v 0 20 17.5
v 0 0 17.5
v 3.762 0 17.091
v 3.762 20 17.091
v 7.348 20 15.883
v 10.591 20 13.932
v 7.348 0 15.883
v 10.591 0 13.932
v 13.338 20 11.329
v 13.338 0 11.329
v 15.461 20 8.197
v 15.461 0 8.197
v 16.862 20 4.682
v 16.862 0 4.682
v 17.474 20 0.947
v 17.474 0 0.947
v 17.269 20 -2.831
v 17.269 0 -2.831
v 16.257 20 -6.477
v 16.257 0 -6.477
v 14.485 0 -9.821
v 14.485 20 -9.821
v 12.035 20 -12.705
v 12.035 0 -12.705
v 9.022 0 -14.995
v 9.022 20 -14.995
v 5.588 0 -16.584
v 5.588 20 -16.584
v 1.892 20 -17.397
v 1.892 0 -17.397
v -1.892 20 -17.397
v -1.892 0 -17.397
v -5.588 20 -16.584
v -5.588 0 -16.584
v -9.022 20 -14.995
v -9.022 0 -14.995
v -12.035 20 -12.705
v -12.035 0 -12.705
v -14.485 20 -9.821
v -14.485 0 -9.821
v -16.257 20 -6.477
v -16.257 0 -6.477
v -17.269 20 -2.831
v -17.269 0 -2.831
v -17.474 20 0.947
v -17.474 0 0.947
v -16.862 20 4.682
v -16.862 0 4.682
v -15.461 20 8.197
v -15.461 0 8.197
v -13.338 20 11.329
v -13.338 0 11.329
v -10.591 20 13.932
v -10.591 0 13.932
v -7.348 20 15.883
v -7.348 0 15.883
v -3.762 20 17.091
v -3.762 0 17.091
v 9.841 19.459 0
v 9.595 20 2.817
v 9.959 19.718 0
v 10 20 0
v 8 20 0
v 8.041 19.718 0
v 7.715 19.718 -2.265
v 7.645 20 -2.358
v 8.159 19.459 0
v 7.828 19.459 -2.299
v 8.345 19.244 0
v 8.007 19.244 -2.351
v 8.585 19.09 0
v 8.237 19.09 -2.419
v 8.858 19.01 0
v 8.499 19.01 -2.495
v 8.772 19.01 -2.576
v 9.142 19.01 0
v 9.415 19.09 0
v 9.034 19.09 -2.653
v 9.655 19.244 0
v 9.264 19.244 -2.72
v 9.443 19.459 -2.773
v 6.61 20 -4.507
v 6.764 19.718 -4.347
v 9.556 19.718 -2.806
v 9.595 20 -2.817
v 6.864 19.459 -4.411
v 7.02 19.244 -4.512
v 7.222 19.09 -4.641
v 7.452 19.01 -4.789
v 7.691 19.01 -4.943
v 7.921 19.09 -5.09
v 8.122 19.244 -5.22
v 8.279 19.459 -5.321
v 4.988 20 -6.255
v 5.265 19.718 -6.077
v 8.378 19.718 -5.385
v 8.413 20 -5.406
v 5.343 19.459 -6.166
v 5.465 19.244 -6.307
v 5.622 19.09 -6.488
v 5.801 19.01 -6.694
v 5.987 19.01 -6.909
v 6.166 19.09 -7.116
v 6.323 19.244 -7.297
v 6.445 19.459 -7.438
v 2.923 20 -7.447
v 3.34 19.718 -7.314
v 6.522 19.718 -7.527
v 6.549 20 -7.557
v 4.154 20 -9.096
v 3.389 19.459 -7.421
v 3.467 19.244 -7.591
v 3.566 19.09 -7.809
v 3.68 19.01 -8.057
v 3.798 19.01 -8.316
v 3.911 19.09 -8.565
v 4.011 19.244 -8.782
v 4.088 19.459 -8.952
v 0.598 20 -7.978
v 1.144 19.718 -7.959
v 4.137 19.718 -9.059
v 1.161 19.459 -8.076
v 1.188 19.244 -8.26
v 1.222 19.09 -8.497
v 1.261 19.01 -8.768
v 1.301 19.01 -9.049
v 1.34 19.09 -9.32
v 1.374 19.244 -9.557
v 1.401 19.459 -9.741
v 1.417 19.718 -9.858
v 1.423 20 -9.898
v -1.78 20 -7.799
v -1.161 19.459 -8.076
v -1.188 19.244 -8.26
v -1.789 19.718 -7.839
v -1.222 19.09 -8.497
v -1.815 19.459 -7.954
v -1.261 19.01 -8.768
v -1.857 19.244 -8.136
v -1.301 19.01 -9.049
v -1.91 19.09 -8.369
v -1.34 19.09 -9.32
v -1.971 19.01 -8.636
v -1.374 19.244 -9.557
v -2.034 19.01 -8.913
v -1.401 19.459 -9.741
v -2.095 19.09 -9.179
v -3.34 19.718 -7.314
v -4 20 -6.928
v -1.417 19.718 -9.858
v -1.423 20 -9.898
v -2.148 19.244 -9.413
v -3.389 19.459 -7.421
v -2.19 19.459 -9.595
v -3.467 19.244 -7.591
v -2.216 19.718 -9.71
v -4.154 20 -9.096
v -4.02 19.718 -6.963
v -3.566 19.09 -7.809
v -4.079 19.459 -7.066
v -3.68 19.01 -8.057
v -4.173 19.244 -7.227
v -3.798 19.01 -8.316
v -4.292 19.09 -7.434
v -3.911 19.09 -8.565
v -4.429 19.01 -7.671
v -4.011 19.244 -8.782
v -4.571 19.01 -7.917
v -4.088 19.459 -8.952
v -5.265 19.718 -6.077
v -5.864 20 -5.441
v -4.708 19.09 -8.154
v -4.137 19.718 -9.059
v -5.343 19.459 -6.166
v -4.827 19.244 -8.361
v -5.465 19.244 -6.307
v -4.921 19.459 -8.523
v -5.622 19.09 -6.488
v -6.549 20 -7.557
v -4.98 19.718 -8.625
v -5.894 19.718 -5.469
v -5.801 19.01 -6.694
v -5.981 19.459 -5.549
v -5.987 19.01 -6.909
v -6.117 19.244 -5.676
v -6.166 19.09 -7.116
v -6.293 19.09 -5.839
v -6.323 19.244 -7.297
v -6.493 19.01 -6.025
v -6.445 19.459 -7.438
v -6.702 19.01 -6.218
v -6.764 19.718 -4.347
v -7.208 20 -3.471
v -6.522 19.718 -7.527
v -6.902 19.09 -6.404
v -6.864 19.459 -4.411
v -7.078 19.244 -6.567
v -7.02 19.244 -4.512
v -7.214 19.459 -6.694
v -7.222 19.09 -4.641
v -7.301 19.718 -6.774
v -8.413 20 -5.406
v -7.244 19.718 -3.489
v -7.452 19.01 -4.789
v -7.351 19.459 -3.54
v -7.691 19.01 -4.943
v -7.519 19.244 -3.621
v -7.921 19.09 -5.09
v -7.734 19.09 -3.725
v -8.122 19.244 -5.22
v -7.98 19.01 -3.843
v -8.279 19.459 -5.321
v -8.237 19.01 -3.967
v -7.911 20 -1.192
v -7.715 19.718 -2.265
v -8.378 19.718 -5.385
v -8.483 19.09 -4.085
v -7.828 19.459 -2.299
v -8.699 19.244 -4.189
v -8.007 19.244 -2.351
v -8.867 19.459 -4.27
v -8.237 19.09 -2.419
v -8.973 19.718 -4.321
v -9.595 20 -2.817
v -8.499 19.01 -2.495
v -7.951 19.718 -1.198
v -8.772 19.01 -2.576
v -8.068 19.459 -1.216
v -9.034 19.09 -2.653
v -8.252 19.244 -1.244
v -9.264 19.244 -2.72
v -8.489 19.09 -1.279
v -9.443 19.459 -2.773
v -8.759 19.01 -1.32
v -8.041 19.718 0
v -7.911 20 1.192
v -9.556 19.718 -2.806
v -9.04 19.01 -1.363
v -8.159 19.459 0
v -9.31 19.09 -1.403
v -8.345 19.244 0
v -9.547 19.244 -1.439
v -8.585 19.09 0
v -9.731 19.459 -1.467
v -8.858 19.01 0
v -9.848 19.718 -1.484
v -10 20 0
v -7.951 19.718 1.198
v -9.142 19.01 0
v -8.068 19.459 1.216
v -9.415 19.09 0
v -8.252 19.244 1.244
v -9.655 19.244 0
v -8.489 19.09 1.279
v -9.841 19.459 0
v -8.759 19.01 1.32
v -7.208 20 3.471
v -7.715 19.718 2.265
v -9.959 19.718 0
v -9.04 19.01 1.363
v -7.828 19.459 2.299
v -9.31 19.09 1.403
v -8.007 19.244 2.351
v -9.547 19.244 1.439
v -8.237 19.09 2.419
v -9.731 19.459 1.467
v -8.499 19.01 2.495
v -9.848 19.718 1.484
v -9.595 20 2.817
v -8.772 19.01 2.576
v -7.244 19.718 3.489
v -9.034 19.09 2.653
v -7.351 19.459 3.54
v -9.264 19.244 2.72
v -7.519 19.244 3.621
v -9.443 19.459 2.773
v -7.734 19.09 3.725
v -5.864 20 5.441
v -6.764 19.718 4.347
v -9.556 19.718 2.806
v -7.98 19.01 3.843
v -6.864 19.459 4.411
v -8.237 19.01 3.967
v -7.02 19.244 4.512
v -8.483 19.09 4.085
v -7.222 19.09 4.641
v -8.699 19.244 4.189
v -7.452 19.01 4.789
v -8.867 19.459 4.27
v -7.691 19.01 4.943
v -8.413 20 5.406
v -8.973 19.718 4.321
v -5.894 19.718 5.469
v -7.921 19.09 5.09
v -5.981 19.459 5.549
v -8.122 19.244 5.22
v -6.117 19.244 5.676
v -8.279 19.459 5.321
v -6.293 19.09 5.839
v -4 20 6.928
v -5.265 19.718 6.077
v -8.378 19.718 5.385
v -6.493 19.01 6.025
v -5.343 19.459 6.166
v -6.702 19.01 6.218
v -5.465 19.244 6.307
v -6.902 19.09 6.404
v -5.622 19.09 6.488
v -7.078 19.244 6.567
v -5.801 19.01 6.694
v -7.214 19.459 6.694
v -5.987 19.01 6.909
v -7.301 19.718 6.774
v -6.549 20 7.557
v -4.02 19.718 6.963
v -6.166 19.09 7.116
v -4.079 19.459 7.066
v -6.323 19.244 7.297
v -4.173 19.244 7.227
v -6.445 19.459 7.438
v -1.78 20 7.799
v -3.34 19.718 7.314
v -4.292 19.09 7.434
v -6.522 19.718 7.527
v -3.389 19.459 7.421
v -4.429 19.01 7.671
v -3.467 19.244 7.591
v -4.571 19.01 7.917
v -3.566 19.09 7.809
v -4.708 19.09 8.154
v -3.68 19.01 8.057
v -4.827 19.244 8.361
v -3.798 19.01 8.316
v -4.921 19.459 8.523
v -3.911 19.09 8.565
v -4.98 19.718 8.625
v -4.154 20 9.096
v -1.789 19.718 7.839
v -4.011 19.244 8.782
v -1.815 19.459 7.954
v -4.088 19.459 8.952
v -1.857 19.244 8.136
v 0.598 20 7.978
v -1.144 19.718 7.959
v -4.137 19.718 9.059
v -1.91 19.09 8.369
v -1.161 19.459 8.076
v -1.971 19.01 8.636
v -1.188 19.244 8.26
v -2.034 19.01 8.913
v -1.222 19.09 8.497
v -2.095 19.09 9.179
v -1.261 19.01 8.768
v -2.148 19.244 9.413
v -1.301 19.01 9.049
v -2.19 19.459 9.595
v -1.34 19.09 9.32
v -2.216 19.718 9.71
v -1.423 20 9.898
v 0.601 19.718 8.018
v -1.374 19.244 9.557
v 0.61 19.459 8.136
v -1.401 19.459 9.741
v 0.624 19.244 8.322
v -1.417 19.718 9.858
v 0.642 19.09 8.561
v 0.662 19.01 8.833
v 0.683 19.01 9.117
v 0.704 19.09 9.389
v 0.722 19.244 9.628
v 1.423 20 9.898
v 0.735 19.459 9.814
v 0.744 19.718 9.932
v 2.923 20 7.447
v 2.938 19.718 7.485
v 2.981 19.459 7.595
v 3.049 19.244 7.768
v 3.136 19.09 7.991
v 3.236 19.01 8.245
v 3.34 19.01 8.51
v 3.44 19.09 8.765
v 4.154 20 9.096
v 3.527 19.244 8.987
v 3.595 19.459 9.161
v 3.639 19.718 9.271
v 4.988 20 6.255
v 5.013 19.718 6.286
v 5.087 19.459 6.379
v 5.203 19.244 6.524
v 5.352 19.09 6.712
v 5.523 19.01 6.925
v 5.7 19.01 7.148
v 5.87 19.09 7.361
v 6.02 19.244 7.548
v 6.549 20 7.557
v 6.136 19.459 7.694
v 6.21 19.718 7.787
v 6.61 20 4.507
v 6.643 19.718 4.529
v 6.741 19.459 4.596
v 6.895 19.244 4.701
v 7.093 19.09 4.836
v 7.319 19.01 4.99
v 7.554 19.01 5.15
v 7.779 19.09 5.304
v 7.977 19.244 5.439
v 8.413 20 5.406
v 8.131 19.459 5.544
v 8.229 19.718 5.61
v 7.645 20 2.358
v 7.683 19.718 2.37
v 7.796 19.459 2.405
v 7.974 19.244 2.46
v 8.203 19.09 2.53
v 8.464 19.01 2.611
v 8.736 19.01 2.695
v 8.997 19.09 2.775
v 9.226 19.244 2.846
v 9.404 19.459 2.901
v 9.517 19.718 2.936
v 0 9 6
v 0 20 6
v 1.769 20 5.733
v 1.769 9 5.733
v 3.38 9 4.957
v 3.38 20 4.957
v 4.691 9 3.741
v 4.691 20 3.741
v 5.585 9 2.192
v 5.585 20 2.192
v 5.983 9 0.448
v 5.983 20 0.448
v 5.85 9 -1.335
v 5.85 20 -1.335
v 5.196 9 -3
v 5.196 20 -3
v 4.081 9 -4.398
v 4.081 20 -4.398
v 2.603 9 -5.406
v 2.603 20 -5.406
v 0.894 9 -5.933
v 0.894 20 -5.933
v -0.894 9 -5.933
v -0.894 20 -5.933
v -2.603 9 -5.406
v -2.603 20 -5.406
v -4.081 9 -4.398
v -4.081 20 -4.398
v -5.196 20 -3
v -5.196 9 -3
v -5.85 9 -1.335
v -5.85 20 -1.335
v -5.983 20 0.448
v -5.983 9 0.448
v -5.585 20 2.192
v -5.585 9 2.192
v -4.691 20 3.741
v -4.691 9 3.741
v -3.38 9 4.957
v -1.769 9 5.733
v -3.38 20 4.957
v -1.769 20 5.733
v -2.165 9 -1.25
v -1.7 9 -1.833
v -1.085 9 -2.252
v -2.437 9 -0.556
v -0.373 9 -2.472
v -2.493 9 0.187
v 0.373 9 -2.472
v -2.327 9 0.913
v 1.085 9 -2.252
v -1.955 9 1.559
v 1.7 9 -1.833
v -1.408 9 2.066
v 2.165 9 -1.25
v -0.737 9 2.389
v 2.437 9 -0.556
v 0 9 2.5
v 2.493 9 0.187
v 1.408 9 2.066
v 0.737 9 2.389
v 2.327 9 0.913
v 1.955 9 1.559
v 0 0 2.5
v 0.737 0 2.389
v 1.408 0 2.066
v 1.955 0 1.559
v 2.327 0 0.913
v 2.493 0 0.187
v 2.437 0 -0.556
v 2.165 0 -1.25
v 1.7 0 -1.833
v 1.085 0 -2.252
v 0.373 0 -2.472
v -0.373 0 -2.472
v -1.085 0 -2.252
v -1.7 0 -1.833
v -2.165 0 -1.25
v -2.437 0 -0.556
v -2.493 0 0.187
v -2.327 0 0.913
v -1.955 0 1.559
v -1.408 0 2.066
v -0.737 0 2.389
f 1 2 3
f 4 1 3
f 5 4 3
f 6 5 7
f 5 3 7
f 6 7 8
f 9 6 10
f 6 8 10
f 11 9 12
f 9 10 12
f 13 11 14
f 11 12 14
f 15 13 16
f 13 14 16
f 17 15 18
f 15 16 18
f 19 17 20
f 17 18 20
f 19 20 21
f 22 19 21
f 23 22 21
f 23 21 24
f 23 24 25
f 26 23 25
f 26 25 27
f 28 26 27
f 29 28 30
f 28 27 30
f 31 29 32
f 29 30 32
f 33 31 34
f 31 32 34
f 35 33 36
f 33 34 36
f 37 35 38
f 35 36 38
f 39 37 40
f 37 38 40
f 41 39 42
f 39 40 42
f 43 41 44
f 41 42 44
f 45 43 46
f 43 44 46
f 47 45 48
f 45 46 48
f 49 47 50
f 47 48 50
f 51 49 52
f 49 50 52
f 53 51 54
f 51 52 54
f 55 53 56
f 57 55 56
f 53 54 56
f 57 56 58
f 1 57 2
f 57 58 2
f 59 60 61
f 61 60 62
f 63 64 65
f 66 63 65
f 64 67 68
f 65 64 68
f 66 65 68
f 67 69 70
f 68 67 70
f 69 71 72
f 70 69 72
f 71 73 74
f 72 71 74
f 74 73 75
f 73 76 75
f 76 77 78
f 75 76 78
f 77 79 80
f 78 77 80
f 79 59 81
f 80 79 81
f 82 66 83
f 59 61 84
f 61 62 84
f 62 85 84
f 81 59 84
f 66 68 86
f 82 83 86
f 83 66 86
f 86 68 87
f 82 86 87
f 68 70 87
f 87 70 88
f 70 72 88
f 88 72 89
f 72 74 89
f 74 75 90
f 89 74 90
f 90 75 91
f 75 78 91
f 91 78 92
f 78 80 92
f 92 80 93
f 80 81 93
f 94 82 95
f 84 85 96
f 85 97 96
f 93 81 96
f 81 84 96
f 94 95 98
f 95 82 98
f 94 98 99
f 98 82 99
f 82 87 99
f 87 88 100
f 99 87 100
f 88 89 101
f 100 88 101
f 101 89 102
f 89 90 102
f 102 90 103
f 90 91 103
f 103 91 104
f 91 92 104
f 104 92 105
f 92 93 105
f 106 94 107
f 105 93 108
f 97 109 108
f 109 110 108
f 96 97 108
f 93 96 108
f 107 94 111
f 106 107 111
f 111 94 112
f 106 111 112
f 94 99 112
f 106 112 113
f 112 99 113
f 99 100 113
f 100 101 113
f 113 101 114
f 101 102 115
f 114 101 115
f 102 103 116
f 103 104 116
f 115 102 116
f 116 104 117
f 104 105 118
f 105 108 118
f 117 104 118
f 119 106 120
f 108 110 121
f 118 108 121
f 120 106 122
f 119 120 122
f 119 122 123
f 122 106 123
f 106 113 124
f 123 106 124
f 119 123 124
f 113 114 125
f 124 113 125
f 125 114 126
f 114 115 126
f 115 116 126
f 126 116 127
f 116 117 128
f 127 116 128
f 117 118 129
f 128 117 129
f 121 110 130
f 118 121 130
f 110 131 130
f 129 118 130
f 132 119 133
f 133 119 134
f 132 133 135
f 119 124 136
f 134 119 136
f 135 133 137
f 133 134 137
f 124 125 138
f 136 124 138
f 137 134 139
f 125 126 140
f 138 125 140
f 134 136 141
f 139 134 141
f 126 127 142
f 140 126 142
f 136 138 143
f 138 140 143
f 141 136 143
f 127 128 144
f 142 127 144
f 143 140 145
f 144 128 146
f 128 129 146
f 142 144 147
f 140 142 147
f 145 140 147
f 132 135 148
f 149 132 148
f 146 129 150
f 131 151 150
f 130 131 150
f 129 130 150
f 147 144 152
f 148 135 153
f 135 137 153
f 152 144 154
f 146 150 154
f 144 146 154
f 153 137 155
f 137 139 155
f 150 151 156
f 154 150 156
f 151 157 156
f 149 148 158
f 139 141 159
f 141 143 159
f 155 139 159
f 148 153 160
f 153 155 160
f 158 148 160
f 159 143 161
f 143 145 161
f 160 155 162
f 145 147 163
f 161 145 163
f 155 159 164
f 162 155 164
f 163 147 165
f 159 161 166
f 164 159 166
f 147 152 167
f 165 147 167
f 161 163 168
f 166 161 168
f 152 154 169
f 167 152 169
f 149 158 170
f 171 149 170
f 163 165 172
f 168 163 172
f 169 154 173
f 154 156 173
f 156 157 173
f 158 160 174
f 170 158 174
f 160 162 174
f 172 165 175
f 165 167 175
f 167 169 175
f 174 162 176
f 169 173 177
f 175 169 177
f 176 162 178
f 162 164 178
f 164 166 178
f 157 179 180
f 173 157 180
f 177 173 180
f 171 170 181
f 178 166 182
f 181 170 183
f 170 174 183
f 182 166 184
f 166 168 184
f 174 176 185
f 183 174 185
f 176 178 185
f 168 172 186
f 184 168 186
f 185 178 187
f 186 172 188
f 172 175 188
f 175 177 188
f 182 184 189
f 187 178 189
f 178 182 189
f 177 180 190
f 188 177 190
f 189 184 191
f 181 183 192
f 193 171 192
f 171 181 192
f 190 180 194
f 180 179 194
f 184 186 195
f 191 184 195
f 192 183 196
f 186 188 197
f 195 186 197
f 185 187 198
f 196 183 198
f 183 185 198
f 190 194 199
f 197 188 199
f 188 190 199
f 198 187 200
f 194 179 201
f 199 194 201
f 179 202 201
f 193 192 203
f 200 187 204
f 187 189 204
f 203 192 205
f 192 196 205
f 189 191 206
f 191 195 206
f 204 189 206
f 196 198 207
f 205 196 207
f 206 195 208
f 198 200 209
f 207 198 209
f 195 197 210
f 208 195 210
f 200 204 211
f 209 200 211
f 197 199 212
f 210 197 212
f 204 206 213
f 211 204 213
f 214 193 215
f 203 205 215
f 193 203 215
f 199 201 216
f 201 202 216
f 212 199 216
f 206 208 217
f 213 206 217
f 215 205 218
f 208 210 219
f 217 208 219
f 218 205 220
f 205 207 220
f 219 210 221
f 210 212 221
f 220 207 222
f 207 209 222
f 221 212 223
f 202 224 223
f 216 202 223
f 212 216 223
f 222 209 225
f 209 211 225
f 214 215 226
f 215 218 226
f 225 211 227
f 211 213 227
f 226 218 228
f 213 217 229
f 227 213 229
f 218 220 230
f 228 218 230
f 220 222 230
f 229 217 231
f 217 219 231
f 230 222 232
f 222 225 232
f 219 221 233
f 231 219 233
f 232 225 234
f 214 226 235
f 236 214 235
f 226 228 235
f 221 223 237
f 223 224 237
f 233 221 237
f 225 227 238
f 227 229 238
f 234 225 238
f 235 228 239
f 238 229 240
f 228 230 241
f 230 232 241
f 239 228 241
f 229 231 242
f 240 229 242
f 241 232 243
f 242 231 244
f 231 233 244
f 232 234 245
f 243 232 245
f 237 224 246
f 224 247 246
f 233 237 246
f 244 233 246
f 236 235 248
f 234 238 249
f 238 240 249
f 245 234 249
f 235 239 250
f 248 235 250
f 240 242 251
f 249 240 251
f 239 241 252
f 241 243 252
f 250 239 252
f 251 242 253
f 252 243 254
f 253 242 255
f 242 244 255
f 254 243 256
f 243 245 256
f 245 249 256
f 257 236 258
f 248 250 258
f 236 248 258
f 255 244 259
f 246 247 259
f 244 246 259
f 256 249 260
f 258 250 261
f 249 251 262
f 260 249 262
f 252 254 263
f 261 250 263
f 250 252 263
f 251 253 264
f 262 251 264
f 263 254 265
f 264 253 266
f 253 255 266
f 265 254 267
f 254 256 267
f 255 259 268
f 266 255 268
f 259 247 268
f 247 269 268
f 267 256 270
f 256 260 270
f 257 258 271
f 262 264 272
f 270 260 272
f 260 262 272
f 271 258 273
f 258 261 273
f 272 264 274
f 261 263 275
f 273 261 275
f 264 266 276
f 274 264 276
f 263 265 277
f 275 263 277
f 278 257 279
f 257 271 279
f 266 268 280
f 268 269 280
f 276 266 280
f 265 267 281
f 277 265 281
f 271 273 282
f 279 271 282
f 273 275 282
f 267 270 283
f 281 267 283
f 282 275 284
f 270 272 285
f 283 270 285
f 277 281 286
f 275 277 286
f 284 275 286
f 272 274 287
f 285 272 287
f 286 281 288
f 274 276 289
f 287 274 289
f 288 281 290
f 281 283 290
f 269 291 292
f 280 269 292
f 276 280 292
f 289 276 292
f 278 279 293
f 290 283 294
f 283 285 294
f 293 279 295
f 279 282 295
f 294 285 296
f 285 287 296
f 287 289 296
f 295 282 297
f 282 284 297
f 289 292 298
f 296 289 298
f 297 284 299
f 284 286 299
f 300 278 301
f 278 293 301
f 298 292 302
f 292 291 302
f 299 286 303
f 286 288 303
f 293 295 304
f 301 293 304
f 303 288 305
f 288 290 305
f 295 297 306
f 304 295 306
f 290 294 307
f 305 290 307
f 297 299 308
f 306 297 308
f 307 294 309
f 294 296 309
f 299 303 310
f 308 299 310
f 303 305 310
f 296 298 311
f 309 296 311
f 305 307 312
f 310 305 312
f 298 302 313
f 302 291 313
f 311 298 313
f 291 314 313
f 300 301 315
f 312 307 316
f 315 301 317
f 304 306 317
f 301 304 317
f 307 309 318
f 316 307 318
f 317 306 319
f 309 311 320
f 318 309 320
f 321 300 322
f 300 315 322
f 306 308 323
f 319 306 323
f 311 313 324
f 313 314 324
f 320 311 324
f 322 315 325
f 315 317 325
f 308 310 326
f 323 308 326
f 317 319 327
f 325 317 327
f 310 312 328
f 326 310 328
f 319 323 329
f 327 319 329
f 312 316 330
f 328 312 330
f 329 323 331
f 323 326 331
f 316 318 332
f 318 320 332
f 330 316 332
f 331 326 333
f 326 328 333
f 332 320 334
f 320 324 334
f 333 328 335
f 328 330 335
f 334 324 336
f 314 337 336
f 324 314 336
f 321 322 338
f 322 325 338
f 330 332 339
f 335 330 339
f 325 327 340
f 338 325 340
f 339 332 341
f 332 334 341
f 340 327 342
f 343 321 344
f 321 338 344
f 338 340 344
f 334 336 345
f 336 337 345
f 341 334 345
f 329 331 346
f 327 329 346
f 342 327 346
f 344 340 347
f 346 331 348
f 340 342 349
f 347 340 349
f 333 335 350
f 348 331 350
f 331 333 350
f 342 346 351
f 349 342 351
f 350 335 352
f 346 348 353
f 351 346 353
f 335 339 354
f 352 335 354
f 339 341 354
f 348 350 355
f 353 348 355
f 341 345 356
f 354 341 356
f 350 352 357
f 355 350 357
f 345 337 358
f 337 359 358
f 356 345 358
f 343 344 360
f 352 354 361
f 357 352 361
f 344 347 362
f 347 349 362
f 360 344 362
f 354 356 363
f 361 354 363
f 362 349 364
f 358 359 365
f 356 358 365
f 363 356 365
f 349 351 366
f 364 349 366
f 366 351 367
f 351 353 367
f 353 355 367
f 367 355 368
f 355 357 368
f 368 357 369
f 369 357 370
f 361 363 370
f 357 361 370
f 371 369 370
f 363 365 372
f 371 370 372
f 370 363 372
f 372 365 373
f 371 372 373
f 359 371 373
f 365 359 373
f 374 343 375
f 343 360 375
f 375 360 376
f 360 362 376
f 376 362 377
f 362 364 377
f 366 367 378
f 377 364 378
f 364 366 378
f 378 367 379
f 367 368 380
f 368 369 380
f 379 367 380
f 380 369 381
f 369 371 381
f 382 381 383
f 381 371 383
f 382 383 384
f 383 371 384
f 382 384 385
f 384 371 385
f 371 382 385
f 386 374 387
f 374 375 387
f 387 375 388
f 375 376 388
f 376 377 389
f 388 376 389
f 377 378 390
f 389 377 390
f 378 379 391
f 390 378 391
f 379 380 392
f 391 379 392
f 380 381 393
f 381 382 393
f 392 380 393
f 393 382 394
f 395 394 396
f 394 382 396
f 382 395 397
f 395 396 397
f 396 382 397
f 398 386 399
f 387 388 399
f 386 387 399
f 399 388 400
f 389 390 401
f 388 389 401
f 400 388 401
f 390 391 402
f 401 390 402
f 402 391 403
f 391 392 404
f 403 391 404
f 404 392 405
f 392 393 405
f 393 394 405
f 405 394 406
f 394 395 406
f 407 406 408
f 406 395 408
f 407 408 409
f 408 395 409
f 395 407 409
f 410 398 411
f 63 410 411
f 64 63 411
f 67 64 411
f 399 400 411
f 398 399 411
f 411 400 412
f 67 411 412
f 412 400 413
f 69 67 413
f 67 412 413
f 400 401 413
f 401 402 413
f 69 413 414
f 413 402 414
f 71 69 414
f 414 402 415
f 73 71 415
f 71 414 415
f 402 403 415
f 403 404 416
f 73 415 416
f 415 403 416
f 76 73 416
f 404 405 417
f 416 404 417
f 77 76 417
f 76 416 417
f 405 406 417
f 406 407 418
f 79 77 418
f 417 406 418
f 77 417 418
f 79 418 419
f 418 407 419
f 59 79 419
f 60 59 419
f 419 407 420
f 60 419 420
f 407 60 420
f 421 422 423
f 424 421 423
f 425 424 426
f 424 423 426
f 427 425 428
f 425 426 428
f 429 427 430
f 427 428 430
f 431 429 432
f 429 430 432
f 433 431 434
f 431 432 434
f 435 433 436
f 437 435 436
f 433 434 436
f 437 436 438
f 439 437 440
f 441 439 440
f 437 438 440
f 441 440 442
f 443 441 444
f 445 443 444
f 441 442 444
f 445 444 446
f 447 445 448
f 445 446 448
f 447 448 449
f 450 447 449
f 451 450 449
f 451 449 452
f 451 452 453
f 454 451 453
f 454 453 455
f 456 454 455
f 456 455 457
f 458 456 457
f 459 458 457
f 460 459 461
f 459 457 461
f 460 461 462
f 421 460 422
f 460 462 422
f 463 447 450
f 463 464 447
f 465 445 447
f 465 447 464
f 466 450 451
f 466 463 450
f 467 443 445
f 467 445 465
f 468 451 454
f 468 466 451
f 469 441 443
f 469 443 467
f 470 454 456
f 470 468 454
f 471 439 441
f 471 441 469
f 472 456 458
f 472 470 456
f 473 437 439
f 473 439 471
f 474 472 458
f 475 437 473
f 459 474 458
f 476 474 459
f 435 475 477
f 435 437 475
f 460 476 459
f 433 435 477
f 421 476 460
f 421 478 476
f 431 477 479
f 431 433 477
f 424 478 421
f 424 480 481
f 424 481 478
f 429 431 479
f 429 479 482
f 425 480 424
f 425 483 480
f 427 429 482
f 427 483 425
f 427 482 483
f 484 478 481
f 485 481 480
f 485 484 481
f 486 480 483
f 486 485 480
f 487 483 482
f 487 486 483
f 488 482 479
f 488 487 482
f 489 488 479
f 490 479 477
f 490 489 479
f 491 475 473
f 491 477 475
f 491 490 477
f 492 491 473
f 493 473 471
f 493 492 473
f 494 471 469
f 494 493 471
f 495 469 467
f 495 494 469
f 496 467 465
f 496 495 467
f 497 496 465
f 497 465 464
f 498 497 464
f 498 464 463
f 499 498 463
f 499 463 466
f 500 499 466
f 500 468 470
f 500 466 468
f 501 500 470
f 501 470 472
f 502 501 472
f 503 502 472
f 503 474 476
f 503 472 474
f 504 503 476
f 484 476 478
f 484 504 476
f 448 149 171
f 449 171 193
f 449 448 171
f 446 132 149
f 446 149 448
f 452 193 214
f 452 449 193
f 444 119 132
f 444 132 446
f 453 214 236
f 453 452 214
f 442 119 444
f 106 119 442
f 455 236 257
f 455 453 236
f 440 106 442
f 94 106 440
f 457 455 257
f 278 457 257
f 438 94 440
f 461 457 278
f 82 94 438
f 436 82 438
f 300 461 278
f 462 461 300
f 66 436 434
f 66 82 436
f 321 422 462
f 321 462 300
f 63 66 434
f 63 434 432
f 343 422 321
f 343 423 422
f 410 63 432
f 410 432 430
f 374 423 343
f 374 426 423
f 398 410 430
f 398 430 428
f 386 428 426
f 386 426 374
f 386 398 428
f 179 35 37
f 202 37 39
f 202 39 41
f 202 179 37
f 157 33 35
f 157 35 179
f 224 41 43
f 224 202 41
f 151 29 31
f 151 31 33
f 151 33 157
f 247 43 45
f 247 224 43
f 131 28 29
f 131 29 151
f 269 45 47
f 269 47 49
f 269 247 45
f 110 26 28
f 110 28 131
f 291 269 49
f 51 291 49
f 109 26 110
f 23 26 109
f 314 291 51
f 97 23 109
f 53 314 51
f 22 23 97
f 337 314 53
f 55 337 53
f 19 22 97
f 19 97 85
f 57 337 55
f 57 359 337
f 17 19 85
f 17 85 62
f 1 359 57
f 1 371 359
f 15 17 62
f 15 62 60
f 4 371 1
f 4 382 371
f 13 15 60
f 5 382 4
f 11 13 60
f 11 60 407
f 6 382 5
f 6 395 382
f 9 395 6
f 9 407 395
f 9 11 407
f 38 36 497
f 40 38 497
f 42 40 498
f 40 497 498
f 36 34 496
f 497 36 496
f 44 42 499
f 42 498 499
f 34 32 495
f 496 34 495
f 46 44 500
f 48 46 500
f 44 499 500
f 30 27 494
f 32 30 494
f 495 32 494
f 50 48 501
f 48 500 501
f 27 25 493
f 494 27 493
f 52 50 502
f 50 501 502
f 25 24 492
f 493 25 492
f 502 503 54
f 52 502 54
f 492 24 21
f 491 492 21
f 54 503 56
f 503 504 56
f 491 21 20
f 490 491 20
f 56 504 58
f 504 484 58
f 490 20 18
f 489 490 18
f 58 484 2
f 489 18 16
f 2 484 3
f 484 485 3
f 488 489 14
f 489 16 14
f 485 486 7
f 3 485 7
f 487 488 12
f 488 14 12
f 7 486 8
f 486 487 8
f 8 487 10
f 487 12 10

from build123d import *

# Parameters (mm, degrees)
SKETCH2_R            = 17.5
BOSS_EXTRUDE1_DEPTH  = 20
CUT_SWEEP1_PROFILE_R = 1
SKETCH62_R           = 2.5
CUT_EXTRUDE3_DEPTH   = 32.819805153
SKETCH65_R           = 6
CUT_EXTRUDE4_DEPTH   = 11


with BuildPart() as part:
    # Sketch2 → Boss-Extrude1 (new body)
    with BuildSketch(Plane(origin=(0, 0, 0), x_dir=(1, 0, 0), z_dir=(0, 1, 0))):
        with Locations(Location((0, 0, 0), (0, 0, 270))):
            Circle(SKETCH2_R)
    extrude(amount=BOSS_EXTRUDE1_DEPTH)

    # Cut-Sweep1: sweep along a path in Sketch39
    with BuildLine(Plane(origin=(0, 20, 0), x_dir=(1, 0, 0), z_dir=(0, 1, 0))) as cut_sweep1_path:
        CenterArc((0, 0), 9, 0, 360)
    # Cut-Sweep1 profile (on start of the path) → Cut-Sweep1 (sweep, cut)
    with BuildSketch(Plane(origin=(9, 20, 0), x_dir=(-1, 0, 0), z_dir=(0, 0, -1))):
        Circle(CUT_SWEEP1_PROFILE_R)
    sweep(path=cut_sweep1_path.line, mode=Mode.SUBTRACT)

    # Sketch62 → Cut-Extrude3 (cut, through all)
    with BuildSketch(Plane(origin=(0, 0, 0), x_dir=(1, 0, 0), z_dir=(0, 1, 0))):
        with Locations(Location((0, 0, 0), (0, 0, 270))):
            Circle(SKETCH62_R)
    extrude(amount=CUT_EXTRUDE3_DEPTH, mode=Mode.SUBTRACT)

    # Sketch65 → Cut-Extrude4 (cut)
    with BuildSketch(Plane(origin=(0, 20, 0), x_dir=(1, 0, 0), z_dir=(0, 1, 0))):
        with Locations(Location((0, 0, 0), (0, 0, 270))):
            Circle(SKETCH65_R)
    extrude(amount=-CUT_EXTRUDE4_DEPTH, mode=Mode.SUBTRACT)


solid = part.part
